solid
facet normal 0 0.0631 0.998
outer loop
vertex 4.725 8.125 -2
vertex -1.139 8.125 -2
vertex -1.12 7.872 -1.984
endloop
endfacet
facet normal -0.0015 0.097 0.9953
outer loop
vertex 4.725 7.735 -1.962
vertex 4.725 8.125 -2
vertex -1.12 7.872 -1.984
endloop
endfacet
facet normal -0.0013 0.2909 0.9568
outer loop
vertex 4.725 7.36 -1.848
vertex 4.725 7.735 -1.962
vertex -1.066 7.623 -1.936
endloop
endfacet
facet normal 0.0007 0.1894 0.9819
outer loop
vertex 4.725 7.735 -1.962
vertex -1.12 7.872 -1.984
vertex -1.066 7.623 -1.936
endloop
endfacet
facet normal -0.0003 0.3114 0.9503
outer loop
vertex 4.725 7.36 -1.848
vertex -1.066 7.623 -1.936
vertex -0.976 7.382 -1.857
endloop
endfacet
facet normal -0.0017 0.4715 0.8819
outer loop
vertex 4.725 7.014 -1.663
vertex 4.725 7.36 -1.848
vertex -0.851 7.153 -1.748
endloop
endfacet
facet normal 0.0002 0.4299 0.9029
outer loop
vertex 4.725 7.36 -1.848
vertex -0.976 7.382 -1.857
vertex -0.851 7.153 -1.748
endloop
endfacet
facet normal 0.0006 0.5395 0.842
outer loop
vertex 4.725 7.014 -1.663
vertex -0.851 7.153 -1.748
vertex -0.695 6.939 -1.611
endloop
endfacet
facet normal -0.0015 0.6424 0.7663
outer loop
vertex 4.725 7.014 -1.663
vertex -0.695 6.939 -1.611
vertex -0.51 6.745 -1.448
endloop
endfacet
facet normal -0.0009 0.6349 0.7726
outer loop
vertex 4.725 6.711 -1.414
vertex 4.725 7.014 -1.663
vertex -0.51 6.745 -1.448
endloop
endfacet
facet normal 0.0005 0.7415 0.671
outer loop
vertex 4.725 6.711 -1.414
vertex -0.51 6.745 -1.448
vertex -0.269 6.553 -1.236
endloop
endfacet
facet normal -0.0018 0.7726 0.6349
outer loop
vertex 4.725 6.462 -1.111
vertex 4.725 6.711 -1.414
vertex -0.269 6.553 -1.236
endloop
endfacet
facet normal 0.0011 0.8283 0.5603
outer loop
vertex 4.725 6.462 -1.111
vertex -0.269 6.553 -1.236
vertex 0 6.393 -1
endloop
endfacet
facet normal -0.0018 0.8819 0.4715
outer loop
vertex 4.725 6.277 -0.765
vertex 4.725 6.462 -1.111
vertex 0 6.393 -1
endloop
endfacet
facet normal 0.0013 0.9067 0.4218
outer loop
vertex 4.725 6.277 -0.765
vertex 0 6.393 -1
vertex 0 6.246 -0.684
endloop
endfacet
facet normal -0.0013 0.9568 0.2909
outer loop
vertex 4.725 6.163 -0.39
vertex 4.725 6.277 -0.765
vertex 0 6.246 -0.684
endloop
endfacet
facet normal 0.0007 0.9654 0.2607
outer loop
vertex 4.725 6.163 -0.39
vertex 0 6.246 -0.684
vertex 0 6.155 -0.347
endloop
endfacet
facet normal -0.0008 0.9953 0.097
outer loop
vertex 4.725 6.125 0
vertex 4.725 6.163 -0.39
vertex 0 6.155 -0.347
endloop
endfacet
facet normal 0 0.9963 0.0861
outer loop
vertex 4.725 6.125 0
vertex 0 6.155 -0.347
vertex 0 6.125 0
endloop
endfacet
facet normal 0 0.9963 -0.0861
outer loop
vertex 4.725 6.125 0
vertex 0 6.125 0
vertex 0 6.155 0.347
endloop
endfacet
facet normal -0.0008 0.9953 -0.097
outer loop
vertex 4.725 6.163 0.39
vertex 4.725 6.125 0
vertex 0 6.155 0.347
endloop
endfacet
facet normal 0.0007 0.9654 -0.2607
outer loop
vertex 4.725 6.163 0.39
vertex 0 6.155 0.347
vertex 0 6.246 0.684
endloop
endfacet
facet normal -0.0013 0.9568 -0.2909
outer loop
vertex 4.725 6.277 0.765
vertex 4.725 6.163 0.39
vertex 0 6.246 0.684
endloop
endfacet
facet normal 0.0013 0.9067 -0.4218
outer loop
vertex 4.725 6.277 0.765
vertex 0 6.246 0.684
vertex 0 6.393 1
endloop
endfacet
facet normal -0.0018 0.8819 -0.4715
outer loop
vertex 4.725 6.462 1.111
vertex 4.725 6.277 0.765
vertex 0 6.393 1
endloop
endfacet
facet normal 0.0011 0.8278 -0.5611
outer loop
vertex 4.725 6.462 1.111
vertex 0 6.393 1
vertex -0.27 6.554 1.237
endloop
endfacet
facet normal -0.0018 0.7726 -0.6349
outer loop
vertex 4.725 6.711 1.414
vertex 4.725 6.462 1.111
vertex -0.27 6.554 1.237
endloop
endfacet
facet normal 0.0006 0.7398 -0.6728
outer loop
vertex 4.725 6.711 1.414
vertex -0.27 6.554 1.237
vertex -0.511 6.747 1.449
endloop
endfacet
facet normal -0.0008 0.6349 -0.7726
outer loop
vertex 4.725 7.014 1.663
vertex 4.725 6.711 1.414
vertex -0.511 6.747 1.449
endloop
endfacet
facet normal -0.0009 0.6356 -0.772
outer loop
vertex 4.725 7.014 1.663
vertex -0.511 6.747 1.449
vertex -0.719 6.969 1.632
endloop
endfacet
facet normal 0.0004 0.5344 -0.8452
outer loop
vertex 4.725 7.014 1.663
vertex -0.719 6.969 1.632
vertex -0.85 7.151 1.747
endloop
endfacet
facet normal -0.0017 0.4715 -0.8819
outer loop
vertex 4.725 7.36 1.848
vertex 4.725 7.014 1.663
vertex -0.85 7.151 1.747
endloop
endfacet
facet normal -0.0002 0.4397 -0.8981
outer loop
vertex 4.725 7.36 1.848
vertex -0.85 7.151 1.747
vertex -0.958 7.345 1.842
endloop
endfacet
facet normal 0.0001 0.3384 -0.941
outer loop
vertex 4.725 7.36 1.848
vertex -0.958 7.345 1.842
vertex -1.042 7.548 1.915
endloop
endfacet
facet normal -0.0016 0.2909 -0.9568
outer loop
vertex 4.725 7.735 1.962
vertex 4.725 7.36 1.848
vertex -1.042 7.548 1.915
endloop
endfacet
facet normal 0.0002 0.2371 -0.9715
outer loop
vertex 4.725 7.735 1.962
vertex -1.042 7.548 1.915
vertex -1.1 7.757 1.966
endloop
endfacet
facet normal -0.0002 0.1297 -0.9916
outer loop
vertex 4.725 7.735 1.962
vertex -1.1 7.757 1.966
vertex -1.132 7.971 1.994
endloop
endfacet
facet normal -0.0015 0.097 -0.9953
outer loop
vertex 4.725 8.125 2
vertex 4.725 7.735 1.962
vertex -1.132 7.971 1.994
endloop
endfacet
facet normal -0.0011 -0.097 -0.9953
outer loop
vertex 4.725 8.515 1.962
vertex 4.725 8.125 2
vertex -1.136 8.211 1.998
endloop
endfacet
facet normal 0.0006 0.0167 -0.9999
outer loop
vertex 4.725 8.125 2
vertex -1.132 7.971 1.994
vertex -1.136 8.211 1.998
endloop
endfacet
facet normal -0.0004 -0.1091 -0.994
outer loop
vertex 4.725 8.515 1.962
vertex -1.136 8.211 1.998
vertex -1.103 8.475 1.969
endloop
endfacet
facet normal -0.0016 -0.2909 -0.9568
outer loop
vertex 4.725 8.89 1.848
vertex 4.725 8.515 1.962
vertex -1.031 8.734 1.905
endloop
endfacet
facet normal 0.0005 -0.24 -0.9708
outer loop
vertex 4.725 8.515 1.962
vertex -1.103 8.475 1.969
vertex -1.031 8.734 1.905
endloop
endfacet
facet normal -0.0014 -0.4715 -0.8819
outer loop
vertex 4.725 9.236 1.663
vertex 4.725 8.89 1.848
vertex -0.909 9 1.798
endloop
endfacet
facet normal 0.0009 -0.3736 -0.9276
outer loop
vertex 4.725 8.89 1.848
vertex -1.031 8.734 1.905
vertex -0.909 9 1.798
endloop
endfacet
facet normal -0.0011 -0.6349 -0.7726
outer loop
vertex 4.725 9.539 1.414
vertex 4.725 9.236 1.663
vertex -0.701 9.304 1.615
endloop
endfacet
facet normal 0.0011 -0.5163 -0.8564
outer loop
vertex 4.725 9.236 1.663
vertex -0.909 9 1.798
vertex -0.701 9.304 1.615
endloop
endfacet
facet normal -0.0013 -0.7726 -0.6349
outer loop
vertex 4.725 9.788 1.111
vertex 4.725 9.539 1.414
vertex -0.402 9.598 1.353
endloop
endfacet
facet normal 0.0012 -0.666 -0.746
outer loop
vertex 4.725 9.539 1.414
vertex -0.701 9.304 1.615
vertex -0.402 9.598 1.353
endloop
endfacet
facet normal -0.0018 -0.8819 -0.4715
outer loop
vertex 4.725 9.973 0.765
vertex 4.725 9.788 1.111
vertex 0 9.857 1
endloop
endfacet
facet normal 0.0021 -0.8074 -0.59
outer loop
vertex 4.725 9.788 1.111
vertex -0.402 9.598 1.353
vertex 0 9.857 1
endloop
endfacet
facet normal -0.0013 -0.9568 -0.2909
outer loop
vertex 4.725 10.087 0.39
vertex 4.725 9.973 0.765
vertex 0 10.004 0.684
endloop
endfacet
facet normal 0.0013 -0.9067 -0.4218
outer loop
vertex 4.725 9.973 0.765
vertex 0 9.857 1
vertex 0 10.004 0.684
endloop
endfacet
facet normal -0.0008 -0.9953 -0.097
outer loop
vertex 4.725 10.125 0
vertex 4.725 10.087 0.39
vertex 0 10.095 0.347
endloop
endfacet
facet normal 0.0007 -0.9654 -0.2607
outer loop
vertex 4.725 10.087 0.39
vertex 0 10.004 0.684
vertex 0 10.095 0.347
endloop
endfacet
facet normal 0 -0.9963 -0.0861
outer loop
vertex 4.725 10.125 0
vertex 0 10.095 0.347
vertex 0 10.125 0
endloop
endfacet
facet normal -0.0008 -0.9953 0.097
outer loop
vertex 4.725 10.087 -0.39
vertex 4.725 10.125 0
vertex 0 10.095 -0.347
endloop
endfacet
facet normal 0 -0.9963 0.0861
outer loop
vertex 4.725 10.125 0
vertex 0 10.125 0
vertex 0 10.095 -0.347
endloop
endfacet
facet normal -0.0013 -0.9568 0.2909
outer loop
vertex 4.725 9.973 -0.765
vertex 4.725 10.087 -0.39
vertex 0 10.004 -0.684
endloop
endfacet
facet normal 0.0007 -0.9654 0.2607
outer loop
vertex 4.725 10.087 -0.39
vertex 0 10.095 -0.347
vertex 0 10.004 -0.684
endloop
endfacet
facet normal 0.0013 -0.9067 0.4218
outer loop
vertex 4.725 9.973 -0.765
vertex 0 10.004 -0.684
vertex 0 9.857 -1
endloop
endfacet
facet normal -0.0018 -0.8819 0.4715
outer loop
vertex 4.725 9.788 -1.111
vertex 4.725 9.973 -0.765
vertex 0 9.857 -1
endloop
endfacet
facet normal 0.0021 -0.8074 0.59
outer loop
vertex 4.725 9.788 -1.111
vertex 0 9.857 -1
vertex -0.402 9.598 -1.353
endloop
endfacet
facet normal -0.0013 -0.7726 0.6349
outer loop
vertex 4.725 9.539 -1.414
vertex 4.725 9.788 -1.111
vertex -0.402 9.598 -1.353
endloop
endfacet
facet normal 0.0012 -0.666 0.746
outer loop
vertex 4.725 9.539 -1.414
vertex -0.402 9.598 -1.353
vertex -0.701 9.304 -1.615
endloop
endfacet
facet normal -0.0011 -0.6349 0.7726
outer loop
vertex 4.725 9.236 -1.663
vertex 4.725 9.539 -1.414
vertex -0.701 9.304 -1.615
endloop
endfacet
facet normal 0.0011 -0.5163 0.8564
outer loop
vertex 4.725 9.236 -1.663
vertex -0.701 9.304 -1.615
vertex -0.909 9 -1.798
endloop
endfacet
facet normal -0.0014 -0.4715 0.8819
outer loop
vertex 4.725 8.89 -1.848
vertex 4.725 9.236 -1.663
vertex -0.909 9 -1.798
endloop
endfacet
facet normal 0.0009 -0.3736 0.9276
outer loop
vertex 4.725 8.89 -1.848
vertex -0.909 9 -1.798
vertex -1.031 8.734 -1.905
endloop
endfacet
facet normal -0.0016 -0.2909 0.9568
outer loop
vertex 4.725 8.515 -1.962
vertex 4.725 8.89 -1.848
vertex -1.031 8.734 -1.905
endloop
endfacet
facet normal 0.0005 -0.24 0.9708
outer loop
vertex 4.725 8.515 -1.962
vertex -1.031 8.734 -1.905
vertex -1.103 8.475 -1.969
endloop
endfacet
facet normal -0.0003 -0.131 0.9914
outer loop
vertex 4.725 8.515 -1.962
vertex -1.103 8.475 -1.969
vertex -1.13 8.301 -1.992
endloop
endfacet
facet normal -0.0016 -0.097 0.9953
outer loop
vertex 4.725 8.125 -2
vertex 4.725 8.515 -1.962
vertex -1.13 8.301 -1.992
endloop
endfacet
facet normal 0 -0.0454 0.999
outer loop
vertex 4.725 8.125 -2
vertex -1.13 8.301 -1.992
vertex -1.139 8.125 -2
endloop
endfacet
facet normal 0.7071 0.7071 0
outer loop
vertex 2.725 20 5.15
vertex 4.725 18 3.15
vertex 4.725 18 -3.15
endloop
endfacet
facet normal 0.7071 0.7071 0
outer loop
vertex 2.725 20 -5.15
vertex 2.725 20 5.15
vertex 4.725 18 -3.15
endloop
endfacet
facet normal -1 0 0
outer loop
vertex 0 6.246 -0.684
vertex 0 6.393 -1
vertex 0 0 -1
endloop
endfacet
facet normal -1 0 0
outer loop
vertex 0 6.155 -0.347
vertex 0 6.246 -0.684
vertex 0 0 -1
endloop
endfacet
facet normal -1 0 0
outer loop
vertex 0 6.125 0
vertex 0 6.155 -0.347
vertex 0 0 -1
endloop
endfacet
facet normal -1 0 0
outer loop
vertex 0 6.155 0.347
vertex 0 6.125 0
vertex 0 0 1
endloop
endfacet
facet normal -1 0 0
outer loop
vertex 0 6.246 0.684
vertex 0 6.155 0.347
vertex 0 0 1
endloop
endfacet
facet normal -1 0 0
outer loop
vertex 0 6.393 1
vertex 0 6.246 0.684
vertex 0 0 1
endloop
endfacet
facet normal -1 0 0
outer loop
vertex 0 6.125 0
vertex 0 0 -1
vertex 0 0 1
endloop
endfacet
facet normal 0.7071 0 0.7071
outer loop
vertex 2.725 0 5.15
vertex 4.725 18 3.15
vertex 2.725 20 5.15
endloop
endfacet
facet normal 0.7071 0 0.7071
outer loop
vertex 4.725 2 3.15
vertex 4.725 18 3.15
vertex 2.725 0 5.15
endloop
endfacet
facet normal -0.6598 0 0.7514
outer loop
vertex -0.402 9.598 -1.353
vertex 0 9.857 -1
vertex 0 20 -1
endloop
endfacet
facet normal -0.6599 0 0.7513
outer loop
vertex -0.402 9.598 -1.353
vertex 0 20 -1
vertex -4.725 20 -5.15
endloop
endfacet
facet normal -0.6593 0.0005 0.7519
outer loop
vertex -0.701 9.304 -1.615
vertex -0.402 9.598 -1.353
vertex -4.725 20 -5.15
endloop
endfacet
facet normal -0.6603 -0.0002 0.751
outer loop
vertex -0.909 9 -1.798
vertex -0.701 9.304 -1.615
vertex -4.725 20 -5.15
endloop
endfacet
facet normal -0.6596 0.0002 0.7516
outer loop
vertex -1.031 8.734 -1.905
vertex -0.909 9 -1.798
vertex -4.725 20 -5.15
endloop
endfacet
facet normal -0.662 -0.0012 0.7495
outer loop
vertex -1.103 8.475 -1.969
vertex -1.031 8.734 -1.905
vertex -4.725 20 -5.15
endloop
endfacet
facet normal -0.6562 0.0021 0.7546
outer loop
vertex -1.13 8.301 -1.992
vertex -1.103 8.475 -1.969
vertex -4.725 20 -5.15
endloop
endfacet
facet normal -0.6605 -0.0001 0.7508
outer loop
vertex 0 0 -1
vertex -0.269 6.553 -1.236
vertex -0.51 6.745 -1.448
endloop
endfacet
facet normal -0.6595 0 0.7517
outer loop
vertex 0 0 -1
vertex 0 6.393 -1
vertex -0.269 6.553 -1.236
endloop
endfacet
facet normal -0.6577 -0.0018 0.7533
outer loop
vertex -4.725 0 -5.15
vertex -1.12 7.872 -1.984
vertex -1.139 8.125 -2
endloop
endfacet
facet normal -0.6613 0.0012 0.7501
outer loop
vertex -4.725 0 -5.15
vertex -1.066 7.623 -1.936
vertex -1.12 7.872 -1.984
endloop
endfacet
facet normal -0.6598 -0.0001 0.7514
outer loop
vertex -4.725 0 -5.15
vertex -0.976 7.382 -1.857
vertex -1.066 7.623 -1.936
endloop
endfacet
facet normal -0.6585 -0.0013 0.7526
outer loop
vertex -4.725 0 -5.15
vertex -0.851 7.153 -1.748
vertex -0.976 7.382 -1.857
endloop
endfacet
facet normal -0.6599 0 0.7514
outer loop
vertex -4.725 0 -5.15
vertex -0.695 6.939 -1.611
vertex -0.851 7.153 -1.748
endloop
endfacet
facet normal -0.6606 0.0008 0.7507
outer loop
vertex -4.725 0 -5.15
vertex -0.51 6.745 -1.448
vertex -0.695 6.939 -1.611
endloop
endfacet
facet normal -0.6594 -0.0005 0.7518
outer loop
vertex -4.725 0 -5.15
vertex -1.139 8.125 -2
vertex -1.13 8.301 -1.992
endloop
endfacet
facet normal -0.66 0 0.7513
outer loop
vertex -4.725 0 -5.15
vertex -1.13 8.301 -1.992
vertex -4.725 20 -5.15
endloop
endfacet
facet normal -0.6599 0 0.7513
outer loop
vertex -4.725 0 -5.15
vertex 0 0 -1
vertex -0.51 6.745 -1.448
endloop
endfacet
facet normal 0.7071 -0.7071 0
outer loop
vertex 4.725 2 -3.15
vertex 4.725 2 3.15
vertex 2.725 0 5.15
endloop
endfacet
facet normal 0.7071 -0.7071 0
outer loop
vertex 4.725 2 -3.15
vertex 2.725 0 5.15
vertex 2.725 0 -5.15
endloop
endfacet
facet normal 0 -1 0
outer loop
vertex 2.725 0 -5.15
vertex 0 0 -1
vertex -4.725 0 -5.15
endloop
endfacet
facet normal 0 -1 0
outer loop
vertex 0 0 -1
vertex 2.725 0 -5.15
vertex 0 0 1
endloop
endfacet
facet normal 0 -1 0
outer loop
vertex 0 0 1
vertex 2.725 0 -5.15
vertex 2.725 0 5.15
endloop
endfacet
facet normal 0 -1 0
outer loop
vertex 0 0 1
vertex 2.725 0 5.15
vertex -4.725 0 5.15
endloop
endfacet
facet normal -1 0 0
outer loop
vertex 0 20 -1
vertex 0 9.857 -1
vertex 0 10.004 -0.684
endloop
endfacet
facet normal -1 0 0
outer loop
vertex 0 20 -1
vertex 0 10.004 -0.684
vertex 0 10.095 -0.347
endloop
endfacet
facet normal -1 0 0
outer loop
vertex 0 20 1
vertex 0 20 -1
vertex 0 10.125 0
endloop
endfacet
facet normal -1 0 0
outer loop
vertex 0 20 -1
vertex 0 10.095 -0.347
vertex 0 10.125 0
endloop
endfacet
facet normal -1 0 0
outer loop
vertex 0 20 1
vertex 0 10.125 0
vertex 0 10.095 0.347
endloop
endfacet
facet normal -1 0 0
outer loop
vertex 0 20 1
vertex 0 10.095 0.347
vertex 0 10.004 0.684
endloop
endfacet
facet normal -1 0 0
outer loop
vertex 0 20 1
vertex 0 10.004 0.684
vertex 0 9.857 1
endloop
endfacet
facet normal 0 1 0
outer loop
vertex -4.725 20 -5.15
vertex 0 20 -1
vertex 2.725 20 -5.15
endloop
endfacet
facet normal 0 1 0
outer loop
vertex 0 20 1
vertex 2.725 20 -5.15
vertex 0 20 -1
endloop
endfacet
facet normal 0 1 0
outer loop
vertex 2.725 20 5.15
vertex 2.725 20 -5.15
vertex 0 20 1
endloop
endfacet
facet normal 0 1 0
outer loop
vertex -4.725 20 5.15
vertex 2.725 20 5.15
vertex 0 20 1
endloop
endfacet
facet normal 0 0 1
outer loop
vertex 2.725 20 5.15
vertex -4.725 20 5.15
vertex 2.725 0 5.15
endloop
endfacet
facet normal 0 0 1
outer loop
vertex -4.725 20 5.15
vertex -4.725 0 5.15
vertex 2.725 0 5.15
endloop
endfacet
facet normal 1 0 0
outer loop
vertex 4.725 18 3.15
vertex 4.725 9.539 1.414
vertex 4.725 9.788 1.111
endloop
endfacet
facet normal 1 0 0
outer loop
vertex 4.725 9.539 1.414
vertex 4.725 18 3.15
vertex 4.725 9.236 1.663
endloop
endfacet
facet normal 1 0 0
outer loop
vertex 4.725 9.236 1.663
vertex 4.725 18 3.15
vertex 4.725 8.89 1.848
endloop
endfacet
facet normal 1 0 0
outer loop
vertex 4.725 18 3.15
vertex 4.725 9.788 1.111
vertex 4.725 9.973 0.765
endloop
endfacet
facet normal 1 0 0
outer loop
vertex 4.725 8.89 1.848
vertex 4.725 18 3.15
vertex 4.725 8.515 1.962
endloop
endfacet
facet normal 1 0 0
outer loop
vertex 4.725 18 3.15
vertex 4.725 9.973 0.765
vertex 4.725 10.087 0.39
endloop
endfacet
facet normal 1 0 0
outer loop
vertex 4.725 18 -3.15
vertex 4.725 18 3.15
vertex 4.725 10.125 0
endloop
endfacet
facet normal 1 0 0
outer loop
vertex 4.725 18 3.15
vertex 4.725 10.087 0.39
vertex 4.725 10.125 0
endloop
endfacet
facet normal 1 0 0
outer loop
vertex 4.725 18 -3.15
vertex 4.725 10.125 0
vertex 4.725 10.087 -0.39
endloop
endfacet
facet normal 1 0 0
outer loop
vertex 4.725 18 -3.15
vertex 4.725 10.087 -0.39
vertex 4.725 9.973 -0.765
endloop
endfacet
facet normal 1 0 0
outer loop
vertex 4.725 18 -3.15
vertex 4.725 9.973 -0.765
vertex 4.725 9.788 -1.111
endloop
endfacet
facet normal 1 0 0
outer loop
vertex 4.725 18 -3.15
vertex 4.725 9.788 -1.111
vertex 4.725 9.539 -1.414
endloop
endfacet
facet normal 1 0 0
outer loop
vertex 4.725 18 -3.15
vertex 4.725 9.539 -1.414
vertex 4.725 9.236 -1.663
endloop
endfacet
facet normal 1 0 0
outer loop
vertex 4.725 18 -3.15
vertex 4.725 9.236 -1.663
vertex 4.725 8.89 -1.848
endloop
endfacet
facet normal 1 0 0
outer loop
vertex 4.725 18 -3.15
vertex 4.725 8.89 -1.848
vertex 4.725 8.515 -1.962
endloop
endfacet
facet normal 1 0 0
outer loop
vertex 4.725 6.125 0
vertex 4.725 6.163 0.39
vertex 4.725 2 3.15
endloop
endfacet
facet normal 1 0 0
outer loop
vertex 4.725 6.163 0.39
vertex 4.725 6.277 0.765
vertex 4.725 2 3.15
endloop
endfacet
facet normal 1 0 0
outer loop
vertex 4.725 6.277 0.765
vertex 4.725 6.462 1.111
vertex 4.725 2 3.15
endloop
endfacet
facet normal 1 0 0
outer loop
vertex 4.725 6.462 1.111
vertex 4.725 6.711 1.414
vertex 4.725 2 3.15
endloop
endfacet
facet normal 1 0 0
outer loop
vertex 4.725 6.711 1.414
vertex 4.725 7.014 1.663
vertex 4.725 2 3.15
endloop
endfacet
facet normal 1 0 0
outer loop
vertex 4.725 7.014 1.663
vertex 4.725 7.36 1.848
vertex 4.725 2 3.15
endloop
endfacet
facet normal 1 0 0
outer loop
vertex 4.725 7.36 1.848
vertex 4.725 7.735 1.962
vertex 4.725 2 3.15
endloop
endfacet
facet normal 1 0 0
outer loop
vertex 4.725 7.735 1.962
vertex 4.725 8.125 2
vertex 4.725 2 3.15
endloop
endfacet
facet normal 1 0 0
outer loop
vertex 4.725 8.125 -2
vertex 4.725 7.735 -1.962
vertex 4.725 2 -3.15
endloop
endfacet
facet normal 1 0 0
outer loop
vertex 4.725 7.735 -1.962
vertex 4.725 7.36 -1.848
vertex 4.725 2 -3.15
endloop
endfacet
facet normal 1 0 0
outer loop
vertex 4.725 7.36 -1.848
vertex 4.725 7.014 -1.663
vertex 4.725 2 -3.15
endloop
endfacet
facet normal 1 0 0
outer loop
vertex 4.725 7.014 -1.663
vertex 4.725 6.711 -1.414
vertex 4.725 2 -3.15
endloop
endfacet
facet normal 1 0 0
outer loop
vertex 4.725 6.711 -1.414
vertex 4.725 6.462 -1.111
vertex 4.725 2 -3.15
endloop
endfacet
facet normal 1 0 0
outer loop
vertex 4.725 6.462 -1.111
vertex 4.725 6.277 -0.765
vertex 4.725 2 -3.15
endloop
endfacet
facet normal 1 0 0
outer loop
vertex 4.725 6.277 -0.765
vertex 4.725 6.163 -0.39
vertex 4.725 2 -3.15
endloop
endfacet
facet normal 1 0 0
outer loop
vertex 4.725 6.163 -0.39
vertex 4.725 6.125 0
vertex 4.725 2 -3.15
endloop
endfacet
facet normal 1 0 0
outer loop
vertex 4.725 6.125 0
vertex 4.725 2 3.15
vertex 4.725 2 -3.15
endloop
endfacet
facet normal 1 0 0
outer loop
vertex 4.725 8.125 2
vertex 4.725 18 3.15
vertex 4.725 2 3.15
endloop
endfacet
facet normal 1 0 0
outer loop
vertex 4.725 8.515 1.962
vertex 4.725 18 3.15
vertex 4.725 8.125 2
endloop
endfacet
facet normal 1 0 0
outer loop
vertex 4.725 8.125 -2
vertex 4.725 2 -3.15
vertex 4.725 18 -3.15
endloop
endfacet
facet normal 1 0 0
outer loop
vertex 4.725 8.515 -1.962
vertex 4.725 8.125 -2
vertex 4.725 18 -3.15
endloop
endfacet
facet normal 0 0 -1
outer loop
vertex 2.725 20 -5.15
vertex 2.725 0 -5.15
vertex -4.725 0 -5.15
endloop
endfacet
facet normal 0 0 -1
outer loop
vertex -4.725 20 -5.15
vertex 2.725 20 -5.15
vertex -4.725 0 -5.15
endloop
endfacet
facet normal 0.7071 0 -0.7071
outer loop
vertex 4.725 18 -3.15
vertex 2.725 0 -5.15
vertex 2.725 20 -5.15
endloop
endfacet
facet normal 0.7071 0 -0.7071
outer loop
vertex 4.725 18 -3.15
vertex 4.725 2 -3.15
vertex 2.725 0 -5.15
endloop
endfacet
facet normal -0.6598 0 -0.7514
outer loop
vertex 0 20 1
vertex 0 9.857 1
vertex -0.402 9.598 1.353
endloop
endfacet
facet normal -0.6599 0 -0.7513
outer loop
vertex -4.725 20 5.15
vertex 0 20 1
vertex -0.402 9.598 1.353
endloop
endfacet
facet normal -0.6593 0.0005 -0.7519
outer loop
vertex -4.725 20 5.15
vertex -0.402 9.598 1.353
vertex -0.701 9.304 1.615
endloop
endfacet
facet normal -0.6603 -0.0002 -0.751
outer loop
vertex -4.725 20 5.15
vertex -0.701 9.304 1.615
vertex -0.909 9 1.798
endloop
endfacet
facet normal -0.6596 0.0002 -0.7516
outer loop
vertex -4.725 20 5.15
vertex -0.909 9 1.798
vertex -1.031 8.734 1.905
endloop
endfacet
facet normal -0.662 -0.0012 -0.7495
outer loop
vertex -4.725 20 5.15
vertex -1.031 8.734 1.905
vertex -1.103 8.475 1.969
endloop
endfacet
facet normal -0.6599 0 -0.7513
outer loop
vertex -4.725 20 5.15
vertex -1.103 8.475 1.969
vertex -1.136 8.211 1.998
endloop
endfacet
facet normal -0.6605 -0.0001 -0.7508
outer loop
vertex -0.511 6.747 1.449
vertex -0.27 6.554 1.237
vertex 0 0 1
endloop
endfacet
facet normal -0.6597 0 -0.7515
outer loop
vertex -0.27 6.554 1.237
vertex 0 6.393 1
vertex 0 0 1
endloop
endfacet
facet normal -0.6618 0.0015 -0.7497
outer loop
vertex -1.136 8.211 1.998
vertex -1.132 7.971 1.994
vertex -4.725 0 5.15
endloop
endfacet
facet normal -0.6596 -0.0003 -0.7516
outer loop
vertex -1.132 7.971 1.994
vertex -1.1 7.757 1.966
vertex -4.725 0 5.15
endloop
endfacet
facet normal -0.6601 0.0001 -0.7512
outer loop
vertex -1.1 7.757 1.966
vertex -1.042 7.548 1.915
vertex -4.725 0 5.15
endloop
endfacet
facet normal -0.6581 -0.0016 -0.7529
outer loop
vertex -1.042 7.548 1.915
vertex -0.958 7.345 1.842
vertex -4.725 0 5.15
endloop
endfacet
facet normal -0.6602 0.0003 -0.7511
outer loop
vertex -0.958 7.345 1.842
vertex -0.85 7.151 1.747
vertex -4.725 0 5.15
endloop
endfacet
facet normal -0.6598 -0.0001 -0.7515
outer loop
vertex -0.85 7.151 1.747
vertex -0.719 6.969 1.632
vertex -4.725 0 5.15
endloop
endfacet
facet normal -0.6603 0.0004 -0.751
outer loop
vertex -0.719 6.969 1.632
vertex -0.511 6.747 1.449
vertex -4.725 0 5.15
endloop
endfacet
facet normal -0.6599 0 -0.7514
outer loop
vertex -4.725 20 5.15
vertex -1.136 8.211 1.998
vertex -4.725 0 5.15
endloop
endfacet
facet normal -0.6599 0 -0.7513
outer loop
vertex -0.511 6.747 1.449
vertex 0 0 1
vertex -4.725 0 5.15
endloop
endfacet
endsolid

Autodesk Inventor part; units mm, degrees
ref_plane "YZ Plane" through (0, 0, 0) normal (1, 0, 0) x (0, 1, 0)
ref_plane "XZ Plane" through (0, 0, 0) normal (0, 1, 0) x (-1, 0, 0)
ref_plane "XY Plane" through (0, 0, 0) normal (0, 0, 1) x (1, 0, 0)
sketch "Sketch1" plane through (0, 0, 0) normal (0, 1, 0) x (-1, 0, 0)
  line L0 (4.725, 5.15) -> (-4.725, 5.15)
  line L1 (-4.725, 5.15) -> (-4.725, -5.15)
  line L2 (-4.725, -5.15) -> (4.725, -5.15)
  line L3 (4.725, 5.15) -> (-4.725, -5.15) construction
  line L4 (-4.725, 5.15) -> (4.725, -5.15) construction
  line L5 (0, 0) -> (0, -1)
  line L6 (0, 0) -> (0, 1)
  line L7 (0, -1) -> (4.725, -5.15)
  line L8 (0, 1) -> (4.725, 5.15)
  dimension "d0" = 9.45
  dimension "d1" = 10.3
  dimension "d2" = 1
  dimension "d3" = 1
extrude "Extrusion1" add sketch "Sketch1" along normal blind 20
sketch "Sketch2" plane through (4.725, 0, 5.15) normal (1, 0, 0) x (0, 0, -1)
  line L0 (10.3, 0) -> (0, 0) construction
  line L1 (10.3, 0) -> (10.3, 20) construction
  line L2 (0, 20) -> (10.3, 20) construction
  line L3 (0, 0) -> (0, 20) construction
  point P0 (5.15, 0)
  point P1 (5.15, 8.125)
hole "Hole1" at (4.725, 8.125, 0) direction (-1, 0, 0) diameter 4 end through all
chamfer "Chamfer1" distance 2 angle 45 4 edges at (4.725, 10, 5.15) (4.725, 0, 0) (4.725, 10, -5.15) (4.725, 20, 0)
properties part number "nut_part"
